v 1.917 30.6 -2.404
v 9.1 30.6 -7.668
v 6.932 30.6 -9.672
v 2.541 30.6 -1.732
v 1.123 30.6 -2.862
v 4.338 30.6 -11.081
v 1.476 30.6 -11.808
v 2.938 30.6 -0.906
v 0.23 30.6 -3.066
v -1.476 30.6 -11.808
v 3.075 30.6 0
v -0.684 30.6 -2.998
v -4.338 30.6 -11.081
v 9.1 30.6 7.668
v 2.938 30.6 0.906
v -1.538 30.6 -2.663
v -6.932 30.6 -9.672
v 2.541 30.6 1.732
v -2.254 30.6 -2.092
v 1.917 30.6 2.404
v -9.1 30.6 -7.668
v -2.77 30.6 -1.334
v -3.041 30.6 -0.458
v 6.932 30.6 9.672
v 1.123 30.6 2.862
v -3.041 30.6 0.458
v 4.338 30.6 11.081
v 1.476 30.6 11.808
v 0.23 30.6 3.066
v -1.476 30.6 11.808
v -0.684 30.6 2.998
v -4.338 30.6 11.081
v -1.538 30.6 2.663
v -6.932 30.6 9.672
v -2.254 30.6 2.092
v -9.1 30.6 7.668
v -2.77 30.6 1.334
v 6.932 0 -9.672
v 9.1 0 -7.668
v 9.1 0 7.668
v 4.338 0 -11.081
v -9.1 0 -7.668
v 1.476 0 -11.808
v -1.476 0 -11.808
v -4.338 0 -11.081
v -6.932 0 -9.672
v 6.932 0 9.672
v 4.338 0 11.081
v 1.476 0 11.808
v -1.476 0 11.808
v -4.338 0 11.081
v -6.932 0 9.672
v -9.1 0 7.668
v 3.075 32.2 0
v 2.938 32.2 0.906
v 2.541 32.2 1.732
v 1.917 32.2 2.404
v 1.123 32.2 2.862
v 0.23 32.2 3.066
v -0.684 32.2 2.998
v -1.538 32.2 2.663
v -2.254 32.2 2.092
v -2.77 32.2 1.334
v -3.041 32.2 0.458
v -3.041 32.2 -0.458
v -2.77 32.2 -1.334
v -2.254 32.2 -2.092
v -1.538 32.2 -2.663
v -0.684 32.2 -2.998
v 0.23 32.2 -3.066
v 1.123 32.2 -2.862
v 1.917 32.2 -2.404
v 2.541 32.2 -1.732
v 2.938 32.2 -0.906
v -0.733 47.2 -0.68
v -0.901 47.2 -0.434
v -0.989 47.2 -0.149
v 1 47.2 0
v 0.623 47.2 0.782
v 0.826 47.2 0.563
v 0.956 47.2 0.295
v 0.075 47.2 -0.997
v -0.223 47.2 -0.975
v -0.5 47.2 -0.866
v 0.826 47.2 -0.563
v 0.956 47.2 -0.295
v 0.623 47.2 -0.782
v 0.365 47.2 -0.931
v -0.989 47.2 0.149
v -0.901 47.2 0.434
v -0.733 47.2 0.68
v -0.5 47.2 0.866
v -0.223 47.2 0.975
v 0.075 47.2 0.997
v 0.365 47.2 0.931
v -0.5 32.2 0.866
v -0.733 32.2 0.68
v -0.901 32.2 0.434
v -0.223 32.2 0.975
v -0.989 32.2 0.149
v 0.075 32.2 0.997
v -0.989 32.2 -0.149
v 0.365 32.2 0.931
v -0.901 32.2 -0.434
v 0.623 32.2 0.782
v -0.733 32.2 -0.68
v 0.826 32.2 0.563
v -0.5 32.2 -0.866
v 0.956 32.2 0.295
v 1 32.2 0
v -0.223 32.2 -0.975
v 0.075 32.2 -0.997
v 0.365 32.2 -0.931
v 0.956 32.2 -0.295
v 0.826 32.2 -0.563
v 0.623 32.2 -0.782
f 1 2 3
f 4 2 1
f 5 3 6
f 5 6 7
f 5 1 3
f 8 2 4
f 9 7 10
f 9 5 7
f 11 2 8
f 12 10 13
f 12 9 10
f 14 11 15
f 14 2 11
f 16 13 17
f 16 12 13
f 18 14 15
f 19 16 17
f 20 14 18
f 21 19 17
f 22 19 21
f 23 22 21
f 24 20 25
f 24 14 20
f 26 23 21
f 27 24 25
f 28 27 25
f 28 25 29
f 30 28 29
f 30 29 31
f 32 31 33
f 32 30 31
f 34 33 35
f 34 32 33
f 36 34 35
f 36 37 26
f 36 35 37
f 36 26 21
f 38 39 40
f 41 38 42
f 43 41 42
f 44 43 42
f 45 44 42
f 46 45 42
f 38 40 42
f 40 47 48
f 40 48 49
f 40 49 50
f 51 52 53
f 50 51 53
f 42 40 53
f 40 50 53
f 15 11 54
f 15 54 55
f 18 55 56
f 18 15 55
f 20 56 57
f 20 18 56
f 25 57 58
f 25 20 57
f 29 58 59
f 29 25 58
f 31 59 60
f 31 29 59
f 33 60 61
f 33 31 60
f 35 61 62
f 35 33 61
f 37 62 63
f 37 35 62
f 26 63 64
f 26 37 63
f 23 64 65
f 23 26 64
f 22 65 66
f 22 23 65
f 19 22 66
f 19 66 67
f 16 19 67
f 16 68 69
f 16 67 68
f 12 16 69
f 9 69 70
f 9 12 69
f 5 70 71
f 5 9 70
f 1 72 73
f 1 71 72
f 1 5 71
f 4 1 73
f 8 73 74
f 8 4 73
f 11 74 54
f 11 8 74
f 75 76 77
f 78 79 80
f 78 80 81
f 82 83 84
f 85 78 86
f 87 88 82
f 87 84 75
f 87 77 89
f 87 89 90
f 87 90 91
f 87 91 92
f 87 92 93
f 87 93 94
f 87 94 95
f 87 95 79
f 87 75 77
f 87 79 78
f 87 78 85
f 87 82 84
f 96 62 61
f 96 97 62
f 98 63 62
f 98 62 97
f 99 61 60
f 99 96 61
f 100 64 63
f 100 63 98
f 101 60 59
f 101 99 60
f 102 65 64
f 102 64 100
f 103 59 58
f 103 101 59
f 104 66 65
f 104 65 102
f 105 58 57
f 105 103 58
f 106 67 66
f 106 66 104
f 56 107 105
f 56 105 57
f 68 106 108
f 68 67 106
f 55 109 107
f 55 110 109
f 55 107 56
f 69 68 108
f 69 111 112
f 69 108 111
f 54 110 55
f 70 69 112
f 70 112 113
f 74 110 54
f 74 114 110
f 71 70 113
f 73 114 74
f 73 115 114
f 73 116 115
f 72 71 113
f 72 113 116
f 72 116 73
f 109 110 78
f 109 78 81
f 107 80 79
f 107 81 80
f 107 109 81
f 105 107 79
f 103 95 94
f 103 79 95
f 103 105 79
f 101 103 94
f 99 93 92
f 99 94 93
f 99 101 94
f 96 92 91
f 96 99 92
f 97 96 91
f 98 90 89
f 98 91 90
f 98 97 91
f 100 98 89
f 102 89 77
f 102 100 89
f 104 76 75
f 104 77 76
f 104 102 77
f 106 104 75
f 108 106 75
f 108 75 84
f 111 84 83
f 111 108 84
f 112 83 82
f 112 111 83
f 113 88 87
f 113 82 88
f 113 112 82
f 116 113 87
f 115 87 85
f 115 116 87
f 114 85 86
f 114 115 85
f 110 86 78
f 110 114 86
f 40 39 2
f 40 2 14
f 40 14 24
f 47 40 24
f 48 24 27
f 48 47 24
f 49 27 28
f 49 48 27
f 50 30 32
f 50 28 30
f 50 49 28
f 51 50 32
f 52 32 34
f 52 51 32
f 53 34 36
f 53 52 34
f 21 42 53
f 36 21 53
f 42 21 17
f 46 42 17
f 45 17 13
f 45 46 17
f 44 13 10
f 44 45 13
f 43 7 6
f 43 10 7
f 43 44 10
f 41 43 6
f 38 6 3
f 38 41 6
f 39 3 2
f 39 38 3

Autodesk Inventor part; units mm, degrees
ref_plane "YZ Plane" through (0, 0, 0) normal (1, 0, 0) x (0, 1, 0)
ref_plane "XZ Plane" through (0, 0, 0) normal (0, 1, 0) x (-1, 0, 0)
ref_plane "XY Plane" through (0, 0, 0) normal (0, 0, 1) x (1, 0, 0)
sketch "Sketch1" plane through (0, 0, 0) normal (0, 1, 0) x (-1, 0, 0)
  point P0 (0, 0)
sketch "Sketch2" plane through (0, 0, 0) normal (0, 1, 0) x (-1, 0, 0)
  arc A0 (9.1, 7.6681) -> (-9.1, 7.6681) centre (0, 0) ccw
  line L0 (0, 0) -> (9.1, 0)
  line L1 (9.1, 0) -> (-9.1, 0)
  line L2 (-9.1, 0) -> (-9.1, -7.6681)
  line L3 (-9.1, 0) -> (-9.1, 7.6681)
  line L4 (9.1, 0) -> (9.1, -7.6681)
  line L5 (9.1, 0) -> (9.1, 7.6681)
  arc A1 (-9.1, -7.6681) -> (9.1, -7.6681) centre (0, 0) ccw
  dimension "d0" = 23.8
  dimension "d1" = 9.1
  dimension "d2" = 18.2
extrude "Extrusion1" add sketch "Sketch2" along normal blind 30.6
sketch "Sketch3" plane through (0, 30.6, 0) normal (0, 1, 0) x (1, 0, 0)
  circle A0 centre (0, 0) radius 3.075
  dimension "d5" = 6.15
extrude "Extrusion2" add sketch "Sketch3" along normal blind 1.6
sketch "Sketch4" plane through (0, 32.2, 0) normal (0, 1, 0) x (1, 0, 0)
  circle A0 centre (0, 0) radius 1
  dimension "d8" = 2
extrude "Extrusion3" add sketch "Sketch4" along normal blind 15
sketch "Sketch5" plane through (0, 30.6, 0) normal (0, 1, 0) x (1, 0, 0)
  arc A0 (-9.1, -7.6681) -> (9.1, -7.6681) centre (0, 0) ccw projected
  line L0 (9.1, -7.6681) -> (-9.1, -7.6681)
  circle A1 centre (0, 0) radius 1 projected
  line L1 (0, 0) -> (0, -7.6681)
properties part number "Dc-Motor"
